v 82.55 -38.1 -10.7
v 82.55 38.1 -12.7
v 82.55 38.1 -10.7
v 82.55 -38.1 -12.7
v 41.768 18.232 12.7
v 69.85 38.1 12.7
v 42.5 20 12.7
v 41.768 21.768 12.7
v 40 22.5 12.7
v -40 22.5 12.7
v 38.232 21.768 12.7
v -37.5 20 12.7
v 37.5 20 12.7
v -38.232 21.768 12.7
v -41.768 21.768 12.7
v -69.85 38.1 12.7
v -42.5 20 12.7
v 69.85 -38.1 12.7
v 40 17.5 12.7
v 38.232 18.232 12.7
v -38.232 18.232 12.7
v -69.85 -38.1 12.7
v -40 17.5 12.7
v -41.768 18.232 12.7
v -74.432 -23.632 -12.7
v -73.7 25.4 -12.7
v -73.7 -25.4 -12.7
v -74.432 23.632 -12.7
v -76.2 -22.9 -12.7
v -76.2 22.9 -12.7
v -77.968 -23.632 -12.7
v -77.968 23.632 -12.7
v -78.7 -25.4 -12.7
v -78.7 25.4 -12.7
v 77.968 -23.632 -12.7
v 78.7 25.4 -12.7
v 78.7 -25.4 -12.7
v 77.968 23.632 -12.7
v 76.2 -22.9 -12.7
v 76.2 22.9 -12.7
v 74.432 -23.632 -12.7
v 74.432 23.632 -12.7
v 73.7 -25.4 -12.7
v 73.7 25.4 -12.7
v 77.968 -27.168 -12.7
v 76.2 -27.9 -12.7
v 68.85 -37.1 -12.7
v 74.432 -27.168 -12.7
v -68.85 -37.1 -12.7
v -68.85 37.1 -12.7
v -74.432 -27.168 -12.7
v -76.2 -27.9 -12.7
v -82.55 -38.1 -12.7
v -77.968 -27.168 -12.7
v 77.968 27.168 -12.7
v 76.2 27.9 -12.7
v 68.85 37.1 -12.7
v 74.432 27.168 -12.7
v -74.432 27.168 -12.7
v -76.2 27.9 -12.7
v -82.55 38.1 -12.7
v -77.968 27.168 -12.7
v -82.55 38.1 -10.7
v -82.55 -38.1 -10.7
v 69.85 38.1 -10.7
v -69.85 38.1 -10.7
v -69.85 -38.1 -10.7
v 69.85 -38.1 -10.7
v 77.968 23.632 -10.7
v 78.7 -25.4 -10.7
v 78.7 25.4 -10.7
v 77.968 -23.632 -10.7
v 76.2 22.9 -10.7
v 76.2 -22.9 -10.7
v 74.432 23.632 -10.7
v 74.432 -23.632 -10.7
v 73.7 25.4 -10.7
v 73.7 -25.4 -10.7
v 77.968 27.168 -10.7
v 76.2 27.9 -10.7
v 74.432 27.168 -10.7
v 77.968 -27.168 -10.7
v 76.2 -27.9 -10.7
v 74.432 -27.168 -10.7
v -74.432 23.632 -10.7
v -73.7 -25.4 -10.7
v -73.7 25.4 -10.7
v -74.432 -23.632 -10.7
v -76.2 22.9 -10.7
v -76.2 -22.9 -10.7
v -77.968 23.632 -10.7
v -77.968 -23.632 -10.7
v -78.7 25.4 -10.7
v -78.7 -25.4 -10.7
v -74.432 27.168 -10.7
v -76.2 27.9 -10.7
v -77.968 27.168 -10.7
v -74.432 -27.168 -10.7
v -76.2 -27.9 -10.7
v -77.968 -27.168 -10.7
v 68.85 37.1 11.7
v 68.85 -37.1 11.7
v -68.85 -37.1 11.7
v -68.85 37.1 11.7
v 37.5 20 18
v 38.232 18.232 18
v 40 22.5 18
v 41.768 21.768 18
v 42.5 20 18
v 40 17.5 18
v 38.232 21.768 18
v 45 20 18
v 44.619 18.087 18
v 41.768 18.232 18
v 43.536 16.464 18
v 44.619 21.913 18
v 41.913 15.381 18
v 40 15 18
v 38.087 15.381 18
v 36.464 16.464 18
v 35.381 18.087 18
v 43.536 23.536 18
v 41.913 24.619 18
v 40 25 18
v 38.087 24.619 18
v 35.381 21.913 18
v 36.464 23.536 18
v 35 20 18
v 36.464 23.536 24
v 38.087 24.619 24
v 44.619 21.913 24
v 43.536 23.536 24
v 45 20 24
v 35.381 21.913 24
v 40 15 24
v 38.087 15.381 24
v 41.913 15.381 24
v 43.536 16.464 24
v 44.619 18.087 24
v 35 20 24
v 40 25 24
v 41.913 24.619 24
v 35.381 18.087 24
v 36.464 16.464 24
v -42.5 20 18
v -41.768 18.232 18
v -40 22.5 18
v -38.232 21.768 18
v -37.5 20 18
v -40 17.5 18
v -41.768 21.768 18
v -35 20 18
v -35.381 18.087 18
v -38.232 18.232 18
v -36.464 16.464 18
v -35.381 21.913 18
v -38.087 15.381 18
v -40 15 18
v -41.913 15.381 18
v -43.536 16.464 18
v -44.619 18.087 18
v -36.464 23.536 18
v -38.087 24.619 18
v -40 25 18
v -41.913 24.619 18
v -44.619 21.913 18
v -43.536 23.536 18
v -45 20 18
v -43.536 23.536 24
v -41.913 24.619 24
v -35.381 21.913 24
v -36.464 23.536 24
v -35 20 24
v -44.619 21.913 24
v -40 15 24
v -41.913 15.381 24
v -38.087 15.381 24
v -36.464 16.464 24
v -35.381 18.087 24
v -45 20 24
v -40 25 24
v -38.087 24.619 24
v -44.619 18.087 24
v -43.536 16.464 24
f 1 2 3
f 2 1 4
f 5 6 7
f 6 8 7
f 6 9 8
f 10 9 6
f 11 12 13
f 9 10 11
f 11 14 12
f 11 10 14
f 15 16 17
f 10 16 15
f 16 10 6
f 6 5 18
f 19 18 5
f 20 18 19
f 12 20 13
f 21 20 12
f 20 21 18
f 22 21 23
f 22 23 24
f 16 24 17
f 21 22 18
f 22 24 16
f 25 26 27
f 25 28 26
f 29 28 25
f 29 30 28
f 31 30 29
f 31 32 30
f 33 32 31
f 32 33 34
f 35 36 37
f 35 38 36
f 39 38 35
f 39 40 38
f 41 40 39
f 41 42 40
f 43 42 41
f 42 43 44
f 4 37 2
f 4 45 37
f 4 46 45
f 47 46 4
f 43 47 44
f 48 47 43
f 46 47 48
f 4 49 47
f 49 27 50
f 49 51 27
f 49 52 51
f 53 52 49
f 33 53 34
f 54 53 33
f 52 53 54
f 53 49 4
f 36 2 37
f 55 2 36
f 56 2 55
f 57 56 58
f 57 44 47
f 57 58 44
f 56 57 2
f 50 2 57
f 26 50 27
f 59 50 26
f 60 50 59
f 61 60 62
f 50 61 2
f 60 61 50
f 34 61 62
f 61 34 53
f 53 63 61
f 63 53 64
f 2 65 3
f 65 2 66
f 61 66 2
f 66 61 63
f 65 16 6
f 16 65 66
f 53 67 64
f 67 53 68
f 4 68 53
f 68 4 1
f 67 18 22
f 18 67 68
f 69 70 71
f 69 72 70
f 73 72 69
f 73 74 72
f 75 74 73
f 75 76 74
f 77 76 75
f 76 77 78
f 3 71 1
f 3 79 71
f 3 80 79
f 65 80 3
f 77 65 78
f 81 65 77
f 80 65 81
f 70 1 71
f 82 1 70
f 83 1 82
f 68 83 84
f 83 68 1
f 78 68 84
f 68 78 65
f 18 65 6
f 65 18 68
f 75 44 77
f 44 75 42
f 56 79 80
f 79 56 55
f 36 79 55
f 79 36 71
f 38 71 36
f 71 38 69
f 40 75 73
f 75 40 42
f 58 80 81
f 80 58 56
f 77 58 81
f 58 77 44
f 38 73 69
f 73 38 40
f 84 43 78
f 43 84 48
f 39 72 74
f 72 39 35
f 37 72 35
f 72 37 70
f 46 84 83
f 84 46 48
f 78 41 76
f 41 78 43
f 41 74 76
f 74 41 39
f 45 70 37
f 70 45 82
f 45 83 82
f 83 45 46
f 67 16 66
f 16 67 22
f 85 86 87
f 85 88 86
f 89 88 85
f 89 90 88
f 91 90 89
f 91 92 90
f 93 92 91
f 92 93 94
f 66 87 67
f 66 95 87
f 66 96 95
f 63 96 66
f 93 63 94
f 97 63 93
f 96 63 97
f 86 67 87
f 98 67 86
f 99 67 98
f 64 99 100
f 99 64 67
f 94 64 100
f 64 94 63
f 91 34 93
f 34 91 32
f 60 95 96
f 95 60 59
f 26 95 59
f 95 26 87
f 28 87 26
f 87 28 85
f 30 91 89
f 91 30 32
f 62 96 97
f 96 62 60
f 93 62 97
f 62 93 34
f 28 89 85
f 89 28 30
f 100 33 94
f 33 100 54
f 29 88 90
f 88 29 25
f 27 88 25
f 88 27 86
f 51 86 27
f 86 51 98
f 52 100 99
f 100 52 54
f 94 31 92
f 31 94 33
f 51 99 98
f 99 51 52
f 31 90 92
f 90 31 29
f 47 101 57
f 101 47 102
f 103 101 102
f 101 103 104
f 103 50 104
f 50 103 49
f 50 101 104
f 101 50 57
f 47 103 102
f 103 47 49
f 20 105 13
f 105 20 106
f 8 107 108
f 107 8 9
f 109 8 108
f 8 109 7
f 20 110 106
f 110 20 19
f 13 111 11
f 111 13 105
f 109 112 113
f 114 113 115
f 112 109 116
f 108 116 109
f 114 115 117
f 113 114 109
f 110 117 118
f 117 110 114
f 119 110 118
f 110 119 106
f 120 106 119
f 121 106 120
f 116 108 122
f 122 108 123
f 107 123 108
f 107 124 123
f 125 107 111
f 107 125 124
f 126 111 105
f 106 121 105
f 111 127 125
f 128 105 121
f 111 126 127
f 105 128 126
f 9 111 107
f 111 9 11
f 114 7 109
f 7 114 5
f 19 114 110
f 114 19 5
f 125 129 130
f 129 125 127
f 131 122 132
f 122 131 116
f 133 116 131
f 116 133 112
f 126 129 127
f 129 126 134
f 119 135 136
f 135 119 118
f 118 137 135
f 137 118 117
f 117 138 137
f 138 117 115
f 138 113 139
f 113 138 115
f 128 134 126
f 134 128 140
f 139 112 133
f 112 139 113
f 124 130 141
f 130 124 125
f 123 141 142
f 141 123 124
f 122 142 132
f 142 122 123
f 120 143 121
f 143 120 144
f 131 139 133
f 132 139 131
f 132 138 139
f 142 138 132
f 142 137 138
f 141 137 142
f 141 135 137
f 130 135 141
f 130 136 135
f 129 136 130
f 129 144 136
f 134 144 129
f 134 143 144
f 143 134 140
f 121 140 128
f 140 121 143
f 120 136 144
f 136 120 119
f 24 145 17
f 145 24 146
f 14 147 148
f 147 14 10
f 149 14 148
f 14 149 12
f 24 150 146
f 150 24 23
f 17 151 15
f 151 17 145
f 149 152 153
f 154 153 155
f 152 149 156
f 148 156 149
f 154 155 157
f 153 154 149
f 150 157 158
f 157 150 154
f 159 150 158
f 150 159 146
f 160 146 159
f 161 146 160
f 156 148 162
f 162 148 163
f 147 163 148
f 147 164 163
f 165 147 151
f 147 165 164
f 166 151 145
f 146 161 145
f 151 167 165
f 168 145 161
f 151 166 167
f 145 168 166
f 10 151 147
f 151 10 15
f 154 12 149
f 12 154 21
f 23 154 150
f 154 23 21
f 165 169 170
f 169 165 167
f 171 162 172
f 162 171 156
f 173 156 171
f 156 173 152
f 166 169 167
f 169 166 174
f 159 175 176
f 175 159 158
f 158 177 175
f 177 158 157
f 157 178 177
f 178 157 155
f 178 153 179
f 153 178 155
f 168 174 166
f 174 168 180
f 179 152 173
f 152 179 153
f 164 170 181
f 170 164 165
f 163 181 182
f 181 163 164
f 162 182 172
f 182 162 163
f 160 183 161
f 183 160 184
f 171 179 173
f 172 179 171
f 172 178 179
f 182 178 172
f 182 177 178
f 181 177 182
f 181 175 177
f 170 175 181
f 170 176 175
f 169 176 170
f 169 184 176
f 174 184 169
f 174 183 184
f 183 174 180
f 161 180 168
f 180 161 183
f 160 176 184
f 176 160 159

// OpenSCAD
// Trying to build icc device
// All measurements are in mm
/*
 Original
 Width = 6.5 inch
 Raised = 5.5 inch
 Edge = 0.5 inch
 Depth = 3.0 inch
 Height = 3.9 inch
 Holes = 2.0 inch apart
 Holes = 0.5 inch from edge (front/back)

 6.5 inch = 165.1 mm
 5.5 inch = 139.7 mm
 3.0 inch = 76.2 mm
 1.0 inch = 25.4 mm
 0.5 inch = 12.7 mm

 cube ( width (x), depth (y), height (z) )

*/

// Variables
width = 165.1;
// height=15; // Flat ICC
height = 25.4;
depth = 76.2;
right_offset = width/2;
left_offset = right_offset*-1;
right_hole = right_offset-(12.7/2);
left_hole = right_hole*-1;
hole_radius = 2.5;
stud_radius = 2.5;
stud_depth = 6;
stud_x = 40;
stud_y = 20;
inch = 25.4;
neg_inch = inch*-1;
hole_height = (height/2)*-1;
support_thickness = 2;
hole_depth = support_thickness * 3;
slice_depth = 25.4;
slice_width = 135;
slice_offset = (depth/2);

// Modules

module stud () {
    color("Lime") 
    
    cylinder(h=stud_depth, r=stud_radius, center=true);
    
    translate( [0, 0, hole_depth] )
     cylinder(h=stud_depth, r=stud_radius*2, center=true);
}

module baseframe() {
    
    difference() {
        
           // Base Cube
       cube([ width, depth,  height ], center=true);
        
        // Right Side Support
        translate([ right_offset, 0, support_thickness ])
        cube([ inch, depth+1, height ], center = true);
        
        // Peg 1
        translate([ right_hole, inch, hole_height ])
        cylinder(h=hole_depth, r=hole_radius, center=true);

        // Peg 2
        translate([ right_hole, neg_inch, hole_height ])
        cylinder(h=hole_depth, r=hole_radius, center=true);
        
        // Left Side Support
        translate([ left_offset, 0, support_thickness ]) 
        cube([ inch, depth+1, height ], center = true);
        
        // Peg 1
        translate([ left_hole, inch, hole_height ])
        cylinder(h=hole_depth, r=hole_radius, center=true);

        // Peg 2
        translate([ left_hole, neg_inch, hole_height ])
        cylinder(h=hole_depth, r=hole_radius, center=true);
    }
}
    

// Main

translate([0,0,0]) {
    
    difference() {
        
        // Back Frame
        baseframe();
        
        cube([ width-inch-support_thickness, depth-2,  height-2 ], center=true);
        
        translate([0,0,-20])
       cube([ width-inch-support_thickness, depth-2,  height-2 ], center=true);
        
    }
    
    union() {
        
        // Studs
        translate( [stud_x, stud_y, 15] )
        stud();

        translate( [-stud_x, stud_y, 15] )
        stud();

    }
}





/* END */
